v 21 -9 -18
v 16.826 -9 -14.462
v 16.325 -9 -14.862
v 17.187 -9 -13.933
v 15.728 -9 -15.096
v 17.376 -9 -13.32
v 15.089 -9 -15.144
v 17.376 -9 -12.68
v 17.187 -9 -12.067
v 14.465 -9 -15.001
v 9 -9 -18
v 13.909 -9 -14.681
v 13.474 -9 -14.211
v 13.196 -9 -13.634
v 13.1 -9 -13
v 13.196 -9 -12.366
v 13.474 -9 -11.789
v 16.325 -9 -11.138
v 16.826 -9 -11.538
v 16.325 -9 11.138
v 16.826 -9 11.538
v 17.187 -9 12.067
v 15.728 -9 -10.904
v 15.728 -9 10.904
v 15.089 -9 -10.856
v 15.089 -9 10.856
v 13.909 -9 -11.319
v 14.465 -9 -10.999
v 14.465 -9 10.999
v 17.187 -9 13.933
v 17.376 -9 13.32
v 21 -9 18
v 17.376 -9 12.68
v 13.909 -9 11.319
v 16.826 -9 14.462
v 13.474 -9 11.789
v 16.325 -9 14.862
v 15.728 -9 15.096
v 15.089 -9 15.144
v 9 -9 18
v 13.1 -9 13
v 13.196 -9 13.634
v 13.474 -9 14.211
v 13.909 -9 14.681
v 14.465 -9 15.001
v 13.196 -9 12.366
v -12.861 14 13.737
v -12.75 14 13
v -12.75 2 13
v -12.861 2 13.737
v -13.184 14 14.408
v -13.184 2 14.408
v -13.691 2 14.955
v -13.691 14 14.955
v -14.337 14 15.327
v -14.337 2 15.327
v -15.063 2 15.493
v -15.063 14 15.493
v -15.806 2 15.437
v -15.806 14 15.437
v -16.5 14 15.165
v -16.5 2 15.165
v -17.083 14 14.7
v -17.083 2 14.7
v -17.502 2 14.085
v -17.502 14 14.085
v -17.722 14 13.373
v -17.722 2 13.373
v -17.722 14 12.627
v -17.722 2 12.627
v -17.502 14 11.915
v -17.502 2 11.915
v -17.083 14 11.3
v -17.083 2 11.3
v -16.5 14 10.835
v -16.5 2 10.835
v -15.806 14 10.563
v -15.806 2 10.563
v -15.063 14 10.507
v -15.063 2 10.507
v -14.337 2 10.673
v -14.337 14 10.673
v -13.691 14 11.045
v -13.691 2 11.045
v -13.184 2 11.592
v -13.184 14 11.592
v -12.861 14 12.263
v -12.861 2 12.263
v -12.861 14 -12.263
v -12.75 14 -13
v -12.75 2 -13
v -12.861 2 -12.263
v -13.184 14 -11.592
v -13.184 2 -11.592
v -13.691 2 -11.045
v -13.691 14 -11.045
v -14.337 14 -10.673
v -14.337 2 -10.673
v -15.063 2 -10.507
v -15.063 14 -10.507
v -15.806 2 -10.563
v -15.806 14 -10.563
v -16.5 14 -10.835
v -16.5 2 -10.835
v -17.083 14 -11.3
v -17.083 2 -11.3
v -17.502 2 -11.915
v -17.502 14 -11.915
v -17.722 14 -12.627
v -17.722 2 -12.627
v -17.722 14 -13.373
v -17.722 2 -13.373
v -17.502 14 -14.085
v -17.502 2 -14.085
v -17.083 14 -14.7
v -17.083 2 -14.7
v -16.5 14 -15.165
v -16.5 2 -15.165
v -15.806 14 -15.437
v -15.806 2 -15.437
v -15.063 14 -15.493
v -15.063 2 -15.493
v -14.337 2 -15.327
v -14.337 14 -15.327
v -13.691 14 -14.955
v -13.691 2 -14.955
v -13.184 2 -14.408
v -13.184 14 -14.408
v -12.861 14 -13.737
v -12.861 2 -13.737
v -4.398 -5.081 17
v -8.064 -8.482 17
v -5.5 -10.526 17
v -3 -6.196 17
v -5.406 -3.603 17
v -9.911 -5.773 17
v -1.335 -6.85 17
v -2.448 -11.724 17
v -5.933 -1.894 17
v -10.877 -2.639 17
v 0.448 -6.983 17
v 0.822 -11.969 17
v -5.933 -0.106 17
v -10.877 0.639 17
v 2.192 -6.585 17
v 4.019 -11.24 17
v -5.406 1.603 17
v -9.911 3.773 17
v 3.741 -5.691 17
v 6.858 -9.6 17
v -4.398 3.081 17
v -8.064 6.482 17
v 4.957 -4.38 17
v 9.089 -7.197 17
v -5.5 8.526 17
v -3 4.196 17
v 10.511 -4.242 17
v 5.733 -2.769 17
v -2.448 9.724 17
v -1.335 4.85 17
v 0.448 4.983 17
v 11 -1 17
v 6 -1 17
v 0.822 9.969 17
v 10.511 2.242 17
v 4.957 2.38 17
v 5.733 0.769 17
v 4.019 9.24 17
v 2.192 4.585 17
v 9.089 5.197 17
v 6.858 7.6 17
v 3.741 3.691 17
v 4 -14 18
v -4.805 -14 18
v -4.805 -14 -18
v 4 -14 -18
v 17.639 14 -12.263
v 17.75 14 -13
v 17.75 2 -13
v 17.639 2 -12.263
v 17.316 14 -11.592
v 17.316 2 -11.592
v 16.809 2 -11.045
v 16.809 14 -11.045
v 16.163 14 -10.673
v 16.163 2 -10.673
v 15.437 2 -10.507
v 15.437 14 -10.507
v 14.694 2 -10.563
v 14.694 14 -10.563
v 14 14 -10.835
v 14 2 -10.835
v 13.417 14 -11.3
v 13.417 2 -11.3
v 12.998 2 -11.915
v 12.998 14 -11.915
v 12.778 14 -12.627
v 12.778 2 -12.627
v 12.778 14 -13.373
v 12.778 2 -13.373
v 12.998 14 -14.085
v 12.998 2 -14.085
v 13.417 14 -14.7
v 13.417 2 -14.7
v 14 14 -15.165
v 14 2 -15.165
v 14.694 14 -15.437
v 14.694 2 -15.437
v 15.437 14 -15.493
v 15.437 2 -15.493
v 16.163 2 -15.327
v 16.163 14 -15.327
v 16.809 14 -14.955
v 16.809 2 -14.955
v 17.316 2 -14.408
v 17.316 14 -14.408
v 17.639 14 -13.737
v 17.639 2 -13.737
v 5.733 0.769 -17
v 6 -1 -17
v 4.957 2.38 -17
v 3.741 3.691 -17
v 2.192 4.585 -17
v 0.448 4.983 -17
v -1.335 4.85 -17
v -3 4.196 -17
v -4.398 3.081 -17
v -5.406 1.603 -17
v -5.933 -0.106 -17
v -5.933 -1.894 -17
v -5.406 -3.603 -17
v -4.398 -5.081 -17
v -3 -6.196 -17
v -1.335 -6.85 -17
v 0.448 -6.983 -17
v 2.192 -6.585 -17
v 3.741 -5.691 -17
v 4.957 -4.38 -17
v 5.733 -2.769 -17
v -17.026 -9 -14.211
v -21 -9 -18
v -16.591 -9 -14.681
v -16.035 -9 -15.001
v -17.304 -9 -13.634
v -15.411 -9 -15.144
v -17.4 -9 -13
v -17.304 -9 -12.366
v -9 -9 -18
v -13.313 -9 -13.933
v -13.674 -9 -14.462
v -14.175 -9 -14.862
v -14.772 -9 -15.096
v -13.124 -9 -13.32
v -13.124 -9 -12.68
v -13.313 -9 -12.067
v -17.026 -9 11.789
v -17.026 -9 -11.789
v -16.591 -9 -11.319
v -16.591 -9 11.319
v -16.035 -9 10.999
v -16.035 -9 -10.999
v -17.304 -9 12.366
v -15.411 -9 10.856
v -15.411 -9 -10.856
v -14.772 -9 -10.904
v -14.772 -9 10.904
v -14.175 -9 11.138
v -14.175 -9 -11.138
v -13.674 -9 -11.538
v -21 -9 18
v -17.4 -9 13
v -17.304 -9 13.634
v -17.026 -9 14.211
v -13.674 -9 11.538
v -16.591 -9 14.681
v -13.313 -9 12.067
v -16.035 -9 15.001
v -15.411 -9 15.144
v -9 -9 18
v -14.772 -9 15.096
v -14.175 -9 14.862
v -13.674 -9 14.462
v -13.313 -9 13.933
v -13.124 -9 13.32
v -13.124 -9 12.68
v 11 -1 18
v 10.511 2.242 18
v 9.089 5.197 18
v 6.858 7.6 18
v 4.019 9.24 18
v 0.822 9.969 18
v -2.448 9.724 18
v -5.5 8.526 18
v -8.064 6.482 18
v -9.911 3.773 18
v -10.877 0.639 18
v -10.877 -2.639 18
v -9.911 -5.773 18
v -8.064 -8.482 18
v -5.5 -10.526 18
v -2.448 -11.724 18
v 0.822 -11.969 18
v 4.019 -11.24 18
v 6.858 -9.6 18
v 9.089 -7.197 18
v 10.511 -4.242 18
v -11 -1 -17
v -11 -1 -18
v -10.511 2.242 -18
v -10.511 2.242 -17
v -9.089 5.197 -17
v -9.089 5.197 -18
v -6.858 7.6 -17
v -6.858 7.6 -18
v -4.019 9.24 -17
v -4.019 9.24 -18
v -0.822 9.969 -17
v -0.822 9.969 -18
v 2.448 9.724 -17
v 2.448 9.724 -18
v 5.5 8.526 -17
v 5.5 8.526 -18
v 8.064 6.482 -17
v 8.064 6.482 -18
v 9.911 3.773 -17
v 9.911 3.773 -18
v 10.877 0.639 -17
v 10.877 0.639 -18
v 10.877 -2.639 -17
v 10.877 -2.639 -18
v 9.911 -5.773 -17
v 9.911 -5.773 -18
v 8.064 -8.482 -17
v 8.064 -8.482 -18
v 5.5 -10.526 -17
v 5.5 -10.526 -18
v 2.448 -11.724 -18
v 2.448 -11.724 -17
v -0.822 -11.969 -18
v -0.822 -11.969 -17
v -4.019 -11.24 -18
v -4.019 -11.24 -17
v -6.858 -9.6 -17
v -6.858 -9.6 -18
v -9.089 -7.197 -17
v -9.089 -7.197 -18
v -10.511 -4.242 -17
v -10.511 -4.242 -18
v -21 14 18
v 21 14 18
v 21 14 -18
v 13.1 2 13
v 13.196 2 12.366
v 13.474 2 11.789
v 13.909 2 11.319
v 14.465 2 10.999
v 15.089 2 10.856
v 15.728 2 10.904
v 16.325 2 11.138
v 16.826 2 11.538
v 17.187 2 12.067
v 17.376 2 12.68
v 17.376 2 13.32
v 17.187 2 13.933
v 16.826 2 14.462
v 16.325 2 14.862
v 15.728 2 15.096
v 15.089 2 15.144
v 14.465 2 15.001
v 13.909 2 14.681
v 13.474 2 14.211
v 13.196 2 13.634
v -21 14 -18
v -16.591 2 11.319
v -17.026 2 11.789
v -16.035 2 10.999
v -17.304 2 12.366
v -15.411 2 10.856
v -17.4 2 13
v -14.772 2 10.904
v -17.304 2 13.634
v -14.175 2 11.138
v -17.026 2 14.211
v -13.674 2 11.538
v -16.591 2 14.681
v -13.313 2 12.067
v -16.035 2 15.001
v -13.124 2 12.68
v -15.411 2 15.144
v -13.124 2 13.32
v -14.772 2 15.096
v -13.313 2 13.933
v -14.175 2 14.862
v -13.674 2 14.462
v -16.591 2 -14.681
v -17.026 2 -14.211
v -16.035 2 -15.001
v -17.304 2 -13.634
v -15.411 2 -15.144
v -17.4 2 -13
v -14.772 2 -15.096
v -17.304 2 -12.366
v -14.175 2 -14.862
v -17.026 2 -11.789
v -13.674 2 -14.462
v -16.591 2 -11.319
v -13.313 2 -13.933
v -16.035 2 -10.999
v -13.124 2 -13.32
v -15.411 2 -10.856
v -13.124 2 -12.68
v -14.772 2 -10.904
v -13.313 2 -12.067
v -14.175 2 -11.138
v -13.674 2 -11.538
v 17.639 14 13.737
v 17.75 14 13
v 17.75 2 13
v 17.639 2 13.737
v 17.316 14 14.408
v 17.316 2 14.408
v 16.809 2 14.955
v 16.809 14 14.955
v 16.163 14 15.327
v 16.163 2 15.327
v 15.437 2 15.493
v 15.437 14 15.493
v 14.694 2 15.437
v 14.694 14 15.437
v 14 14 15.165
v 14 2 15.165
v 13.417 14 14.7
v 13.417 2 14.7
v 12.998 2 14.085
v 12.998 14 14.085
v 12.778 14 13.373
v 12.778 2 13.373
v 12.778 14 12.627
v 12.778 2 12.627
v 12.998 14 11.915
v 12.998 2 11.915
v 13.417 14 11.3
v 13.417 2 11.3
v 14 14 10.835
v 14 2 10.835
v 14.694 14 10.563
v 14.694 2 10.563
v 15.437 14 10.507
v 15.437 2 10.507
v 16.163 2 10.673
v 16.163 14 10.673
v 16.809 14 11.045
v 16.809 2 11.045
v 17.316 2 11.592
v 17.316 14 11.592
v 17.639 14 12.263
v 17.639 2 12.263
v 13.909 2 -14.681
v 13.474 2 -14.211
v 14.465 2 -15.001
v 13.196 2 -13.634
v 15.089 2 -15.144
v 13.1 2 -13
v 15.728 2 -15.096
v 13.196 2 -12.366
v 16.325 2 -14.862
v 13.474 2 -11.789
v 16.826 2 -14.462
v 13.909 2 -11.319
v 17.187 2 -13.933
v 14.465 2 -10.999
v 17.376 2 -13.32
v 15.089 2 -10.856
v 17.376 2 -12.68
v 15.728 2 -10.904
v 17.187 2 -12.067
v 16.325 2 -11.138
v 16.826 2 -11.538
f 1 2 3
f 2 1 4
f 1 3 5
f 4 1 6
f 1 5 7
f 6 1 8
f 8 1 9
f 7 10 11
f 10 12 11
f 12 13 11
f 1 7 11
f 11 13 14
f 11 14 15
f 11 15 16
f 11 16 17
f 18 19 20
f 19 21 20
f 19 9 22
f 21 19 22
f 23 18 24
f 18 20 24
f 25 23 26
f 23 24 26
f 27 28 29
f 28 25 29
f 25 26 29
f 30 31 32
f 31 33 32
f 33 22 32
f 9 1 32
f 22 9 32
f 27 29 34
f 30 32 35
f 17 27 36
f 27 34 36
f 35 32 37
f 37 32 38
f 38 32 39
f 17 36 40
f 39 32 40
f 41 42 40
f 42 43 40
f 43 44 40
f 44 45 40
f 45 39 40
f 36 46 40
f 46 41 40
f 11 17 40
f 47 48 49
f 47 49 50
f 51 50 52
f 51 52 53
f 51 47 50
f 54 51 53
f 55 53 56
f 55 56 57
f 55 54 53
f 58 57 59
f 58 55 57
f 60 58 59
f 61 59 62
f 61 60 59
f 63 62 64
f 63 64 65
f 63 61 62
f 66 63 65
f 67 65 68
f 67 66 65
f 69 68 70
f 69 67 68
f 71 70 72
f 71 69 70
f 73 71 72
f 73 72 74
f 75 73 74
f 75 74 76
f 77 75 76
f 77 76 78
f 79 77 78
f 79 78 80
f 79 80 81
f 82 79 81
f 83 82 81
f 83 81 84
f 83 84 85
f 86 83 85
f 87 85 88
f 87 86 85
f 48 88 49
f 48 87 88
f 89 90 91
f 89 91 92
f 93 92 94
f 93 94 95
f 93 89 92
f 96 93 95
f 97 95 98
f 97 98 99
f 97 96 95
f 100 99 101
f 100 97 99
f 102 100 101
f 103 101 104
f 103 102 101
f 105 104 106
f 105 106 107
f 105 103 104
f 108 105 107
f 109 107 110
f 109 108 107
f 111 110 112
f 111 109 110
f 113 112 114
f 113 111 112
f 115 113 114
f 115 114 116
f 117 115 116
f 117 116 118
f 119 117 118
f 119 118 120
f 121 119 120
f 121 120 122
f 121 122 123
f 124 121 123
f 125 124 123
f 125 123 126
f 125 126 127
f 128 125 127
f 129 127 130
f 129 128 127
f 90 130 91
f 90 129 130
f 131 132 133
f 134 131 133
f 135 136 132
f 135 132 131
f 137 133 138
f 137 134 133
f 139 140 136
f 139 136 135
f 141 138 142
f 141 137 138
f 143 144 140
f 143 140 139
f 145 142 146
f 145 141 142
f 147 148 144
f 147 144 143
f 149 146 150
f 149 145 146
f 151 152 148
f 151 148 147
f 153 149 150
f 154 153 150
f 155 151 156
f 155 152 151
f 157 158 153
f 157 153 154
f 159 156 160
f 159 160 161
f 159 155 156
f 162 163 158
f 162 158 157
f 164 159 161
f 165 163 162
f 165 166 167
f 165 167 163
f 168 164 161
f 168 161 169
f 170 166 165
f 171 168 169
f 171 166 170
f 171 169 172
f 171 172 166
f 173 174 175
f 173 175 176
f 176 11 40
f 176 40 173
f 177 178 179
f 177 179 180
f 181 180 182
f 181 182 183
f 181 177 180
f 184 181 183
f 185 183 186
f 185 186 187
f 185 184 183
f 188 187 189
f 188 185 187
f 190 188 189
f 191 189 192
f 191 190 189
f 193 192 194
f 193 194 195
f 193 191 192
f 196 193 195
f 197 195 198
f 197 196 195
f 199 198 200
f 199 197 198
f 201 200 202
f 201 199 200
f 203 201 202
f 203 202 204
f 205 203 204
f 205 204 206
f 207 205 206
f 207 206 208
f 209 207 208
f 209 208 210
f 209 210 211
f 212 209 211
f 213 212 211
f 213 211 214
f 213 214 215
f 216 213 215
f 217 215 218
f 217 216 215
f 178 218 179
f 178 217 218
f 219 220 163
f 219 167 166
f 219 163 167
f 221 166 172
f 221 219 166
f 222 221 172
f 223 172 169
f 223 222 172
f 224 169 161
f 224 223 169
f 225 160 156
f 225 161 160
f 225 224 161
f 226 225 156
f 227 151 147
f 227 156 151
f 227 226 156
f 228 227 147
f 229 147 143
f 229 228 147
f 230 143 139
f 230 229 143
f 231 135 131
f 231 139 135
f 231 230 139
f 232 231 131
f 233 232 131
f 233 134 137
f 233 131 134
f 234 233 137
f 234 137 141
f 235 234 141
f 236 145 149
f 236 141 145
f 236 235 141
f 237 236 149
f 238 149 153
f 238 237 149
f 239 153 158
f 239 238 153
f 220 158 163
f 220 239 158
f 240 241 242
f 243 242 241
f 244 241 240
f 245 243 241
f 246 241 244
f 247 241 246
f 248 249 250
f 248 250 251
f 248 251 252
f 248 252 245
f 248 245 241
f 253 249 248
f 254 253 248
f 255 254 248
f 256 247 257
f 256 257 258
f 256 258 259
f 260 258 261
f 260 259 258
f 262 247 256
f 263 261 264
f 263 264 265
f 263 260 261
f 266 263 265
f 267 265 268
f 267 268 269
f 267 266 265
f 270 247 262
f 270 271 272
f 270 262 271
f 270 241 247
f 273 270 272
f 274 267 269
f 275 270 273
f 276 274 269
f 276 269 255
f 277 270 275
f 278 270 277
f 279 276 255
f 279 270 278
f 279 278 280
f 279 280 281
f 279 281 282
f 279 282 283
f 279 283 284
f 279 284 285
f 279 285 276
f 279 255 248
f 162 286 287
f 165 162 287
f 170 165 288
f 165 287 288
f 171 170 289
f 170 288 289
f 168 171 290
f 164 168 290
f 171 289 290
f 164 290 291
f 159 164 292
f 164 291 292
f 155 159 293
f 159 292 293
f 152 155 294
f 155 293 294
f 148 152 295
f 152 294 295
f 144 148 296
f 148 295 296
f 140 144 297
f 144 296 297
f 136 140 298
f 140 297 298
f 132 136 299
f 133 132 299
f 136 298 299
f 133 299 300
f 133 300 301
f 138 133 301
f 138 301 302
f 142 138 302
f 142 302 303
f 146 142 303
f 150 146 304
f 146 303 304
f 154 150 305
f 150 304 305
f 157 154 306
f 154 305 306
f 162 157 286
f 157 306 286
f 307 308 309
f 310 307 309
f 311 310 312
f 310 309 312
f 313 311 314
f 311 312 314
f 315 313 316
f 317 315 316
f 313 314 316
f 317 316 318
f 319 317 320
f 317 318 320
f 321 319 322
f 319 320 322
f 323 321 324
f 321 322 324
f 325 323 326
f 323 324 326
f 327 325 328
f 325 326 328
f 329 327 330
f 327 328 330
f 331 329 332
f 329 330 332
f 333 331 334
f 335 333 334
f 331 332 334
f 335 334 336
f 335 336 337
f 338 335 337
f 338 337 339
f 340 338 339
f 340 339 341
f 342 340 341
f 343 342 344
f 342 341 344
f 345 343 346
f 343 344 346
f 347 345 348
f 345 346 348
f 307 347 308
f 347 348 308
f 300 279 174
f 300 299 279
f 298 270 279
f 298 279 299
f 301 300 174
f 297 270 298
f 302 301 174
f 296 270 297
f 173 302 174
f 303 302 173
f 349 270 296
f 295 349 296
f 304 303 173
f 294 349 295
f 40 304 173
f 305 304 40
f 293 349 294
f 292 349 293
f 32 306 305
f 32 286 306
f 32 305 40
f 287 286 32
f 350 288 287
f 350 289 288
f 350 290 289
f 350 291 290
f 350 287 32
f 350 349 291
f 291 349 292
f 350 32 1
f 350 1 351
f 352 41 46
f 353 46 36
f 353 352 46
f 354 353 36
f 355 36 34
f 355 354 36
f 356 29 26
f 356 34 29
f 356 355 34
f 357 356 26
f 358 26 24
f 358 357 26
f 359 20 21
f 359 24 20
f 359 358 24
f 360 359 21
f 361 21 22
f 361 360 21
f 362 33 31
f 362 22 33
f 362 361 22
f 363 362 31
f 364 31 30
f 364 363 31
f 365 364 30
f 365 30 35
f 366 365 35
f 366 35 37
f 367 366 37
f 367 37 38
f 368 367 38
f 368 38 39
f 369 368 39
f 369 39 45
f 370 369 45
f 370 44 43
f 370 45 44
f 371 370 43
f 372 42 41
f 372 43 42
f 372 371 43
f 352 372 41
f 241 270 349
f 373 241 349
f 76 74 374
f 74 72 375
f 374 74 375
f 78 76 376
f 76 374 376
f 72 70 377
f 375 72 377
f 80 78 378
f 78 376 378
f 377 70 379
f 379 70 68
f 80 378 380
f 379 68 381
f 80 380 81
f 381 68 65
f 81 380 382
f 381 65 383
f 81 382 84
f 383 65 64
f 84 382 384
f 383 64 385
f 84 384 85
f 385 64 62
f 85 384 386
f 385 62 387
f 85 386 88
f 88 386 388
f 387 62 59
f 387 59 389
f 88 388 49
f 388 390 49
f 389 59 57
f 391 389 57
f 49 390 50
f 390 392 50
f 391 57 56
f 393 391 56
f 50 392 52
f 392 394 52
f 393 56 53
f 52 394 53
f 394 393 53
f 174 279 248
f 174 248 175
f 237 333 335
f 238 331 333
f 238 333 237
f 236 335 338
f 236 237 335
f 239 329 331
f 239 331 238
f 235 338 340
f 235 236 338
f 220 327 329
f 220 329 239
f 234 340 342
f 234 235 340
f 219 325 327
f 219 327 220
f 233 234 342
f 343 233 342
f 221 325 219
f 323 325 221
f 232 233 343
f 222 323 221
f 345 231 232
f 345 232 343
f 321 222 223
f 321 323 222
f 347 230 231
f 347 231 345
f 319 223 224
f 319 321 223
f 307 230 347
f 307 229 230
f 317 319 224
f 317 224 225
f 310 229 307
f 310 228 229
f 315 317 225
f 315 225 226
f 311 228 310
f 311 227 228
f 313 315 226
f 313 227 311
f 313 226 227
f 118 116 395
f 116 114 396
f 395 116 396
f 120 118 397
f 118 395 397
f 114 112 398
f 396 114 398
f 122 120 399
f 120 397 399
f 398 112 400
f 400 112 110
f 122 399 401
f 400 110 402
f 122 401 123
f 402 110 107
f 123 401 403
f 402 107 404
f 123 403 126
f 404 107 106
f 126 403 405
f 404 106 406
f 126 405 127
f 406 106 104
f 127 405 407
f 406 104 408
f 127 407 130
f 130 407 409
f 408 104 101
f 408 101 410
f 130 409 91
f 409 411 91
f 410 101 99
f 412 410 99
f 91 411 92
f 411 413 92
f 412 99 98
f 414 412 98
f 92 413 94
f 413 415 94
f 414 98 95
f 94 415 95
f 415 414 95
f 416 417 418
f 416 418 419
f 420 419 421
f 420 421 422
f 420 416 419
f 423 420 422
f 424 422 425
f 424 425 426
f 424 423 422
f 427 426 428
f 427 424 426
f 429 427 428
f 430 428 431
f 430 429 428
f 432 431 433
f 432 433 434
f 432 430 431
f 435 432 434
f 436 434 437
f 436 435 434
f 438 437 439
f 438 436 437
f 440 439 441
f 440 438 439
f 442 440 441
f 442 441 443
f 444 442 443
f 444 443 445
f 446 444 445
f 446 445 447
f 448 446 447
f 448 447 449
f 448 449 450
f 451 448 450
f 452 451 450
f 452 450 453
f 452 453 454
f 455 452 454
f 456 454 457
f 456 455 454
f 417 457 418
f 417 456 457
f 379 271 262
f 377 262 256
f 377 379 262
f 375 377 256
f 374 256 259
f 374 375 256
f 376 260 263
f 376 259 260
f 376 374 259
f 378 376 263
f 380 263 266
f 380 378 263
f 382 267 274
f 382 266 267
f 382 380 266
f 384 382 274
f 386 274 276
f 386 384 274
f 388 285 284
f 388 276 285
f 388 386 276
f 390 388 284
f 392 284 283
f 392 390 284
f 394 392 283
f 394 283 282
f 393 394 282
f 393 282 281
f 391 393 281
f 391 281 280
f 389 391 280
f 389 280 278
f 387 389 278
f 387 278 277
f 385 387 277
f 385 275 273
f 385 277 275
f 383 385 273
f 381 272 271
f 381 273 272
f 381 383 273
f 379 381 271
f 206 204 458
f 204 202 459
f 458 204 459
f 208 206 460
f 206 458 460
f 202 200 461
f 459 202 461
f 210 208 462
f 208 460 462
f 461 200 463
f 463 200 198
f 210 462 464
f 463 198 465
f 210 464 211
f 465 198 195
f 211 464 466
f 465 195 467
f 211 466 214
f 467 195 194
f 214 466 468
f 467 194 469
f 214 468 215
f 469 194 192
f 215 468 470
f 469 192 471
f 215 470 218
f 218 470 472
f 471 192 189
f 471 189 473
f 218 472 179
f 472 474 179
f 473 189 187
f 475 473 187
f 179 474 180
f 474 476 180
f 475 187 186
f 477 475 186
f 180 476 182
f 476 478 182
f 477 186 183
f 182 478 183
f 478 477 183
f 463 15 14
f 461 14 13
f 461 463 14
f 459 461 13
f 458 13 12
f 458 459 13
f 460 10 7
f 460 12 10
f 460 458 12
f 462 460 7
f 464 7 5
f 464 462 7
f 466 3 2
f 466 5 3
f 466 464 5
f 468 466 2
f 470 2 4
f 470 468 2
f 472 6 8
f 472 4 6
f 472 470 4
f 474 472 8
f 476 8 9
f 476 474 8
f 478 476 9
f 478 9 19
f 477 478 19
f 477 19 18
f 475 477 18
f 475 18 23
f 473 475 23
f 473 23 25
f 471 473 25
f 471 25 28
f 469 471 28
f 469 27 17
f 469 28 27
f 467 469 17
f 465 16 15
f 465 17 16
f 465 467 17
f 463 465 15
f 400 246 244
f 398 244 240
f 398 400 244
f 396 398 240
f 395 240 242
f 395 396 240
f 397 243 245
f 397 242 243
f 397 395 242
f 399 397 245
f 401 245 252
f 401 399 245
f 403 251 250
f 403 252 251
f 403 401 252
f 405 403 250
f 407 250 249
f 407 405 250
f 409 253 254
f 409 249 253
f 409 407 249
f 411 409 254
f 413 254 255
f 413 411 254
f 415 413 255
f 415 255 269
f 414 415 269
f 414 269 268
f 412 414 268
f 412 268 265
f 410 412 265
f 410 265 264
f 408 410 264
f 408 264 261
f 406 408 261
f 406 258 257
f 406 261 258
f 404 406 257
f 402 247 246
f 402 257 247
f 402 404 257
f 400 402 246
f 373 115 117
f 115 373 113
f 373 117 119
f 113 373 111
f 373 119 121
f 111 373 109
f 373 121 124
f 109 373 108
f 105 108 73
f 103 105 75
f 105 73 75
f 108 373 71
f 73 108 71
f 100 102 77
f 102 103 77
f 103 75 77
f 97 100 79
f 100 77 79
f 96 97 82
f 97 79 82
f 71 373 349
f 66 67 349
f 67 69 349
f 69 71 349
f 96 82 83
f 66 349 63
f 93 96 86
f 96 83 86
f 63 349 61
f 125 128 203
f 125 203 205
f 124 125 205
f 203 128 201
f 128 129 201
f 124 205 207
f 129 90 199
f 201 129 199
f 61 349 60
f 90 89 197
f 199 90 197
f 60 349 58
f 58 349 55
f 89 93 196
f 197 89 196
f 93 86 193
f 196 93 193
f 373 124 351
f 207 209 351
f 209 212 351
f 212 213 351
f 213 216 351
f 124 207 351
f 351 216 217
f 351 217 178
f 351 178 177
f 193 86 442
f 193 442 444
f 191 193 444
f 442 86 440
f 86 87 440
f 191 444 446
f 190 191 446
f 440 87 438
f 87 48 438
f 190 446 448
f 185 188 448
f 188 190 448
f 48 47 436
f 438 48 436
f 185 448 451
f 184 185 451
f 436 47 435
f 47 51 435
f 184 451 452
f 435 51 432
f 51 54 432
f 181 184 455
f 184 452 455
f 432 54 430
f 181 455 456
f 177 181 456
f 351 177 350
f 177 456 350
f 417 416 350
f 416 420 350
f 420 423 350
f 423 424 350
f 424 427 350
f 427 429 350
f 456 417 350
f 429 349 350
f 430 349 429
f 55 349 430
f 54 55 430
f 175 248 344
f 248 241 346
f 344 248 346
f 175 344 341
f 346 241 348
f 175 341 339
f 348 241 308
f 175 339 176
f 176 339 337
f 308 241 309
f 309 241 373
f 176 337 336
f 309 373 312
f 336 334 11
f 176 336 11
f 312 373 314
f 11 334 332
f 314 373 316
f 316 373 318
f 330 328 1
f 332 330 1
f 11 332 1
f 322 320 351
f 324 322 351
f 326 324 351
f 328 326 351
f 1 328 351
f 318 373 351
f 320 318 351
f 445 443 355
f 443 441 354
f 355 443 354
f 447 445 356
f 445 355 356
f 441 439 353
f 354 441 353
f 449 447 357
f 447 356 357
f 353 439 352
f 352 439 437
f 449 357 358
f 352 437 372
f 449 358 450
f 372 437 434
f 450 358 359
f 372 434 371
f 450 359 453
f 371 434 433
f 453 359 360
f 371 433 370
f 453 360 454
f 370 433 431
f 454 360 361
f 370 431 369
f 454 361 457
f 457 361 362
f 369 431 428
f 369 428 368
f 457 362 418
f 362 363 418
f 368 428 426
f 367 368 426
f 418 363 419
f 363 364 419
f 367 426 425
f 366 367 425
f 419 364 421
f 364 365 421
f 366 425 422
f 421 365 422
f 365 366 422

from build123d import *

# Parameters (mm, degrees)
SKETCH1_W           = 42
SKETCH1_H           = 28
SKETCH1_R           = 6
BOSS_EXTRUDE1_DEPTH = 18
CUT_EXTRUDE5_DEPTH  = 37
SKETCH2_R           = 2.15
CUT_EXTRUDE1_DEPTH  = 29
SKETCH3_R           = 2.5
CUT_EXTRUDE2_DEPTH  = 12
SKETCH4_R           = 11
CUT_EXTRUDE3_DEPTH  = 1
SKETCH5_R           = 11
CUT_EXTRUDE4_DEPTH  = 1


with BuildPart() as part:
    # Sketch1 → Boss-Extrude1 (new body, symmetric)
    with BuildSketch(Plane.XY):
        Rectangle(SKETCH1_W, SKETCH1_H)
        with Locations((0, -1)):
            Circle(SKETCH1_R, mode=Mode.SUBTRACT)
    extrude(amount=BOSS_EXTRUDE1_DEPTH, both=True)

    # Sketch6 → Cut-Extrude5 (cut, through all)
    with BuildSketch(Plane.XY.offset(18)):
        Polygon((-21, -9), (-9, -9), (-4.804501844, -14), (-21, -14), align=None)
        Polygon((21, -9), (9, -9), (4, -14), (21, -14), align=None)
    extrude(amount=-CUT_EXTRUDE5_DEPTH, mode=Mode.SUBTRACT)

    # Sketch2 → Cut-Extrude1 (cut, through all)
    with BuildSketch(Plane(origin=(0, 14, 0), x_dir=(-1, 0, 0), z_dir=(0, -1, 0))):
        with Locations((15.25, -13)):
            Circle(SKETCH2_R)
        with Locations((-15.25, -13)):
            Circle(SKETCH2_R)
        with Locations((-15.25, 13)):
            Circle(SKETCH2_R)
        with Locations((15.25, 13)):
            Circle(SKETCH2_R)
    extrude(amount=CUT_EXTRUDE1_DEPTH, mode=Mode.SUBTRACT)

    # Sketch3 → Cut-Extrude2 (cut)
    with BuildSketch(Plane.XZ.offset(-14)):
        with Locations((-15.25, 13)):
            Circle(SKETCH3_R)
        with Locations((15.25, 13)):
            Circle(SKETCH3_R)
        with Locations((15.25, -13)):
            Circle(SKETCH3_R)
        with Locations((-15.25, -13)):
            Circle(SKETCH3_R)
    extrude(amount=CUT_EXTRUDE2_DEPTH, mode=Mode.SUBTRACT)

    # Sketch4 → Cut-Extrude3 (cut)
    with BuildSketch(Plane.XY.offset(18)):
        with Locations((0, -1)):
            Circle(SKETCH4_R)
    extrude(amount=-CUT_EXTRUDE3_DEPTH, mode=Mode.SUBTRACT)

    # Sketch5 → Cut-Extrude4 (cut)
    with BuildSketch(Plane(origin=(0, 0, -18), x_dir=(-1, 0, 0), z_dir=(0, 0, -1))):
        with Locations((0, -1)):
            Circle(SKETCH5_R)
    extrude(amount=-CUT_EXTRUDE4_DEPTH, mode=Mode.SUBTRACT)


solid = part.part
